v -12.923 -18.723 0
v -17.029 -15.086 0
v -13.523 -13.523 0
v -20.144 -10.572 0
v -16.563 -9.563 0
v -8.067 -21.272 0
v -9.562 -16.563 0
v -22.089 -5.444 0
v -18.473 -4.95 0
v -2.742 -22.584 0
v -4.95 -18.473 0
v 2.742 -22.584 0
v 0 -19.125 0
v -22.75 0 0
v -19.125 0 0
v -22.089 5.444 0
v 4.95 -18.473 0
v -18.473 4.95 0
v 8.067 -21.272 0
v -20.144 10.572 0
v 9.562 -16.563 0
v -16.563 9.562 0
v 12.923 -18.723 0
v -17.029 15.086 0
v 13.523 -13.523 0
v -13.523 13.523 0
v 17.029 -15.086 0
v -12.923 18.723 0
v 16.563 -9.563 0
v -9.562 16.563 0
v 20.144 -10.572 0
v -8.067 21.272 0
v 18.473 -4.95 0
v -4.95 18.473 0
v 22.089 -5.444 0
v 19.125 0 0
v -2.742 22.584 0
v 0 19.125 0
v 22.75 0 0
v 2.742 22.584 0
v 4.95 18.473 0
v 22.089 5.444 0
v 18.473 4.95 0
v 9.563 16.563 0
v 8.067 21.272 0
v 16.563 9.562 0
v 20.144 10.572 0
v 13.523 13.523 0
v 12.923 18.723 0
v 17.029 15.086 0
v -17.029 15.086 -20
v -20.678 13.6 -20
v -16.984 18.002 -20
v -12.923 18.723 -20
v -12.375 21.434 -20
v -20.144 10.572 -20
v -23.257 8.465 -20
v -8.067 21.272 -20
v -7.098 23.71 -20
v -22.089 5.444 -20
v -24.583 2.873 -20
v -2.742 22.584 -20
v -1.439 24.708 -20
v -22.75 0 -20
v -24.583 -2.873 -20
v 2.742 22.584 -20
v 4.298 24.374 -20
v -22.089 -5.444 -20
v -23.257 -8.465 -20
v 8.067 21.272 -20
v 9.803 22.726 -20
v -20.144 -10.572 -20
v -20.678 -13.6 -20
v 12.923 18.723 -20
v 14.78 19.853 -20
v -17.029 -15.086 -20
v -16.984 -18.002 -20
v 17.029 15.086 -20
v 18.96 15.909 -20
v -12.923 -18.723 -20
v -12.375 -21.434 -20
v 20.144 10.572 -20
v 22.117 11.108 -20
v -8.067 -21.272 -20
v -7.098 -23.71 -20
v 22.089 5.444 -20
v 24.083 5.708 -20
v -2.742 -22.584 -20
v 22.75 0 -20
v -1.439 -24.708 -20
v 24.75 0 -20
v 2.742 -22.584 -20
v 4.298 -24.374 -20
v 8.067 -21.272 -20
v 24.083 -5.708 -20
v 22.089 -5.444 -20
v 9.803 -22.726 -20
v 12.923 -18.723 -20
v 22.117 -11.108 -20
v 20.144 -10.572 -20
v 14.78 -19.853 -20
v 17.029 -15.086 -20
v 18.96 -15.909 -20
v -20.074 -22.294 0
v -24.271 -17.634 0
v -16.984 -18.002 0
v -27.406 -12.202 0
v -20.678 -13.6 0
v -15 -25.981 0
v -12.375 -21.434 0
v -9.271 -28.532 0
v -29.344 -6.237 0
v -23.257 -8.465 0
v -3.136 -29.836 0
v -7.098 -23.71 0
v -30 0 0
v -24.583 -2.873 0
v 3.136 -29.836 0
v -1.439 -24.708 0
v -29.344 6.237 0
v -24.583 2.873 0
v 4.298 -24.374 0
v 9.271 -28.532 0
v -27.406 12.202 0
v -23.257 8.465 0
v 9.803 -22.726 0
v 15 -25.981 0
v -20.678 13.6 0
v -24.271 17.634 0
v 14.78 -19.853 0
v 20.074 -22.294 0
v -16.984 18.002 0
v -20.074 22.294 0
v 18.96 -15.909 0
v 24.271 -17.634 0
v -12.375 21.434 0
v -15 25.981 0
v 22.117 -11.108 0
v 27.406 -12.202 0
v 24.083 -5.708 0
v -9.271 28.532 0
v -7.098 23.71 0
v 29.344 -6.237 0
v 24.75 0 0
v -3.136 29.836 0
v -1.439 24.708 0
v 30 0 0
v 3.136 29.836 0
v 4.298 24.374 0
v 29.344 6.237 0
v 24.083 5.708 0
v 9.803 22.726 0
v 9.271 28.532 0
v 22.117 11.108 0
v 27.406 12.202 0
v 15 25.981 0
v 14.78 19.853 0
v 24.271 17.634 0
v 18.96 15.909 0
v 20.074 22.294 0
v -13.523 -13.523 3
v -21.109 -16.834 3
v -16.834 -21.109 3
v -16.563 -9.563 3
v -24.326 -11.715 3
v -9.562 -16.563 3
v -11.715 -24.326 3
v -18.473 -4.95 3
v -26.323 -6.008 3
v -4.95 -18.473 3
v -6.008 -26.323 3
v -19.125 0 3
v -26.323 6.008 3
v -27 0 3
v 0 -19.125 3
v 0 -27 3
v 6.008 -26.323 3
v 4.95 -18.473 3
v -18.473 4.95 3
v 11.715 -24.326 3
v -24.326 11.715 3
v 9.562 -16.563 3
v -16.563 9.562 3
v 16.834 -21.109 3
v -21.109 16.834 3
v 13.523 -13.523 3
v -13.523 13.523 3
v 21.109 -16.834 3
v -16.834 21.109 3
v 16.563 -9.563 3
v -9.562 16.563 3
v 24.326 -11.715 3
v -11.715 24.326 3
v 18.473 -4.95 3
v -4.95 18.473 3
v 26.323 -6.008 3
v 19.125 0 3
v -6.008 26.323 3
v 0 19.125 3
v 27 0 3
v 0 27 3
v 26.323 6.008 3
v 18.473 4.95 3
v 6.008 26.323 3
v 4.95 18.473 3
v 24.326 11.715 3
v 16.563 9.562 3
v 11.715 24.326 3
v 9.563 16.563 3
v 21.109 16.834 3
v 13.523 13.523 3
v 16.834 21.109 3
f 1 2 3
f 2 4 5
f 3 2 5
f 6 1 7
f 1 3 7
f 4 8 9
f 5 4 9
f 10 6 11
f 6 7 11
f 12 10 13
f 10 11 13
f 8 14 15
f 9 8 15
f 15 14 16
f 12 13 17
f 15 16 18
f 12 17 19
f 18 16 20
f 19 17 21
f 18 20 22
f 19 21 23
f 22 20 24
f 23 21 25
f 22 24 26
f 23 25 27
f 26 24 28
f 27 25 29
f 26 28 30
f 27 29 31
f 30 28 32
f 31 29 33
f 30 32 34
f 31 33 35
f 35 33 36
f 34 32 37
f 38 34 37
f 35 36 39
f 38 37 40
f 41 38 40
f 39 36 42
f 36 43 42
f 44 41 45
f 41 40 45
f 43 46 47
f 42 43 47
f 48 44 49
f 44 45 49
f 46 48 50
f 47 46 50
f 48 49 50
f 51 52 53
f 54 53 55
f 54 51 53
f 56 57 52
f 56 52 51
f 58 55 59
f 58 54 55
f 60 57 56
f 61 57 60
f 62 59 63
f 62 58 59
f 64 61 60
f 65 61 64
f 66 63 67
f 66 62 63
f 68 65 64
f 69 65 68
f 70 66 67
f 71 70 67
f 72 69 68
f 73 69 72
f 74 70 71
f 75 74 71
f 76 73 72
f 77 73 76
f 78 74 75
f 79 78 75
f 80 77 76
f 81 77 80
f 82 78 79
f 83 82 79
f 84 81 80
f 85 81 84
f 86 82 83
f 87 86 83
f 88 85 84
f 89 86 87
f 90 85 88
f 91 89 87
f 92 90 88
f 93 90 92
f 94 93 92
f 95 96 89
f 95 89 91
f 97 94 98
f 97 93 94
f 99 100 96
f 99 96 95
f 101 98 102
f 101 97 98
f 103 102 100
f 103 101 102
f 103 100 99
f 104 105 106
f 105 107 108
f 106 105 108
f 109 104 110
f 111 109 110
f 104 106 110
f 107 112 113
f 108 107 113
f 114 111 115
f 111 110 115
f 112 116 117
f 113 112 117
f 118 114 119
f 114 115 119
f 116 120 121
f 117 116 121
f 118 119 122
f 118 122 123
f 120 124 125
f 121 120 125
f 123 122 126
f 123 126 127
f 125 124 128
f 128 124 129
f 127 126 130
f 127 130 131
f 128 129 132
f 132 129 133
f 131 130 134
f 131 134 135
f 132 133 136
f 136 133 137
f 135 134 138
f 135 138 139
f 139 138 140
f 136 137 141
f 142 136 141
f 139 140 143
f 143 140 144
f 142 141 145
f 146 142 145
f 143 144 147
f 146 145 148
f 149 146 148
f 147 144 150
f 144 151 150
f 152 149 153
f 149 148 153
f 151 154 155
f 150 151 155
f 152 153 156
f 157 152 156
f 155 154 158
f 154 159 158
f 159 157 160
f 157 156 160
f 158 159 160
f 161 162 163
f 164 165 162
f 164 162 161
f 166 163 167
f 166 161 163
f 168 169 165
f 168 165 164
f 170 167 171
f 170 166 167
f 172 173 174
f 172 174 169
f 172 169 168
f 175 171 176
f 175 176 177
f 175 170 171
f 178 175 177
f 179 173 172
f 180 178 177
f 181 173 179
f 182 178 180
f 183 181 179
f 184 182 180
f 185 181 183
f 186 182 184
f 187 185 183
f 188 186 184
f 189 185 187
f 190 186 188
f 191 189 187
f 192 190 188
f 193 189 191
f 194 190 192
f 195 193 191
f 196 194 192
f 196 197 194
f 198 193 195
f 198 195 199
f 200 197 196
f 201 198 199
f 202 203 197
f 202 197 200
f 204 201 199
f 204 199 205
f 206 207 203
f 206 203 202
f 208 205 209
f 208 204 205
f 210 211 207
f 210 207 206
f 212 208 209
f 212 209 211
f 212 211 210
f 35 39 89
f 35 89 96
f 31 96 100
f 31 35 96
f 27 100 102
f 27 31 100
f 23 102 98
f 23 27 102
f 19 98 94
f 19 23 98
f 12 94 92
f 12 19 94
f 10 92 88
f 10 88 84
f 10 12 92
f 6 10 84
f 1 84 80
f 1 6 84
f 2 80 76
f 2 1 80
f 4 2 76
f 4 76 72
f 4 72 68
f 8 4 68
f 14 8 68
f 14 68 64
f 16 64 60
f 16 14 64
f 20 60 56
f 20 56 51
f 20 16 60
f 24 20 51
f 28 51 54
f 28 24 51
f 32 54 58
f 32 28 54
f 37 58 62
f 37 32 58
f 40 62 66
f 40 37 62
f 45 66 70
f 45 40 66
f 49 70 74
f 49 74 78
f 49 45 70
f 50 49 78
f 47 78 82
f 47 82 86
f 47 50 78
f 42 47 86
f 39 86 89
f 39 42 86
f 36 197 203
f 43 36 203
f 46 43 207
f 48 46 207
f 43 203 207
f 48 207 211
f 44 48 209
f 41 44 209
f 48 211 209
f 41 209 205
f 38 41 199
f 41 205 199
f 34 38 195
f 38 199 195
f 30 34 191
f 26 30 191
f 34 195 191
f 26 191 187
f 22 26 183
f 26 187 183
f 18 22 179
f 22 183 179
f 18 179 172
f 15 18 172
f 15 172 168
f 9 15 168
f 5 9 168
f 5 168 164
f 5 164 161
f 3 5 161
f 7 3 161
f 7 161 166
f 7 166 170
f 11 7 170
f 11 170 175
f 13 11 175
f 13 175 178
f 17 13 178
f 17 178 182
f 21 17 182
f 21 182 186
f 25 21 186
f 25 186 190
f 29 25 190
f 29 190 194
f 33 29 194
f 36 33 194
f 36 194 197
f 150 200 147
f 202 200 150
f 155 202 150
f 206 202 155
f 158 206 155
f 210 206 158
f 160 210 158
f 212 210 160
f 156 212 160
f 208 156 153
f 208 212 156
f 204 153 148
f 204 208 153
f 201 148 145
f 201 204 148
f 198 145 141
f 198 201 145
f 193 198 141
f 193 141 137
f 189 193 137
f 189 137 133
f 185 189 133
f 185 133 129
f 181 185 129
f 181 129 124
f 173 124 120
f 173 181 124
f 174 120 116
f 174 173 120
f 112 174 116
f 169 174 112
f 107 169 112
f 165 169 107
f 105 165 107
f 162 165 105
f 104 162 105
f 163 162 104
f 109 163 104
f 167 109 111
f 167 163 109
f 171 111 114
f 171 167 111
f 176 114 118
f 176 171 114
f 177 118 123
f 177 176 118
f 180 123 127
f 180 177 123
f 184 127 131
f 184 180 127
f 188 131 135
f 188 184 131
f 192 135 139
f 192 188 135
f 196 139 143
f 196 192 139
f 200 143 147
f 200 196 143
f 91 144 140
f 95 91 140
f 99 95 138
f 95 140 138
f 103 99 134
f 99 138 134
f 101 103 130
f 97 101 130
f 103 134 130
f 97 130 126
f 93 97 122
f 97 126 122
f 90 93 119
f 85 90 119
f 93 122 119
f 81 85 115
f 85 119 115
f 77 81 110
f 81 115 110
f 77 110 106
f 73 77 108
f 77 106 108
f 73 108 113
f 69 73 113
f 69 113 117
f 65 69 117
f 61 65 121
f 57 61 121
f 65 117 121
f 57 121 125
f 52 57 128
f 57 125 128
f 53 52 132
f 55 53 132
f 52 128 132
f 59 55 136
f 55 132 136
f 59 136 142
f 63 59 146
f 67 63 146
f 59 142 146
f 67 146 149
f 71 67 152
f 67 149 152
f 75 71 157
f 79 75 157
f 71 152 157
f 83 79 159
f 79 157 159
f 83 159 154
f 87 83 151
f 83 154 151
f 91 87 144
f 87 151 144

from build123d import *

# Parameters (mm, degrees)
F0_R     = 30
F1_DEPTH = 3
F2_SIZE  = 2.99999
F3_R     = 19.125
F4_DEPTH = 3.001
F5_R     = 24.75
F5_R_2   = 22.75
F6_DEPTH = 20


# Not quite as in the source:
# - a fillet or chamfer is up to 0.001 mm smaller than in the source, because OpenCascade refuses the exact size


with BuildPart() as f1:
    # F0 (on Top) → F1 (new body)
    with BuildSketch(Plane.XY):
        Circle(F0_R)
    extrude(amount=F1_DEPTH)

    # F2 (size 3 in the source; OpenCascade refuses exactly that, so slightly less here)
    f2_edges = [f1.edges().sort_by_distance(p)[0] for p in [
        (-30, 0, 3),
    ]]
    chamfer(f2_edges, length=F2_SIZE)

    # F3 (on face) → F4 (cut, through all)
    with BuildSketch(Plane.XY.offset(3)):
        Circle(F3_R)
    extrude(amount=-F4_DEPTH, mode=Mode.SUBTRACT)

    # F5 (on face) → F6 (join)
    with BuildSketch(Plane(origin=(0, 0, 0), x_dir=(1, 0, 0), z_dir=(0, 0, -1))):
        Circle(F5_R)
        Circle(F5_R_2, mode=Mode.SUBTRACT)
    extrude(amount=F6_DEPTH)


solid = f1.part
